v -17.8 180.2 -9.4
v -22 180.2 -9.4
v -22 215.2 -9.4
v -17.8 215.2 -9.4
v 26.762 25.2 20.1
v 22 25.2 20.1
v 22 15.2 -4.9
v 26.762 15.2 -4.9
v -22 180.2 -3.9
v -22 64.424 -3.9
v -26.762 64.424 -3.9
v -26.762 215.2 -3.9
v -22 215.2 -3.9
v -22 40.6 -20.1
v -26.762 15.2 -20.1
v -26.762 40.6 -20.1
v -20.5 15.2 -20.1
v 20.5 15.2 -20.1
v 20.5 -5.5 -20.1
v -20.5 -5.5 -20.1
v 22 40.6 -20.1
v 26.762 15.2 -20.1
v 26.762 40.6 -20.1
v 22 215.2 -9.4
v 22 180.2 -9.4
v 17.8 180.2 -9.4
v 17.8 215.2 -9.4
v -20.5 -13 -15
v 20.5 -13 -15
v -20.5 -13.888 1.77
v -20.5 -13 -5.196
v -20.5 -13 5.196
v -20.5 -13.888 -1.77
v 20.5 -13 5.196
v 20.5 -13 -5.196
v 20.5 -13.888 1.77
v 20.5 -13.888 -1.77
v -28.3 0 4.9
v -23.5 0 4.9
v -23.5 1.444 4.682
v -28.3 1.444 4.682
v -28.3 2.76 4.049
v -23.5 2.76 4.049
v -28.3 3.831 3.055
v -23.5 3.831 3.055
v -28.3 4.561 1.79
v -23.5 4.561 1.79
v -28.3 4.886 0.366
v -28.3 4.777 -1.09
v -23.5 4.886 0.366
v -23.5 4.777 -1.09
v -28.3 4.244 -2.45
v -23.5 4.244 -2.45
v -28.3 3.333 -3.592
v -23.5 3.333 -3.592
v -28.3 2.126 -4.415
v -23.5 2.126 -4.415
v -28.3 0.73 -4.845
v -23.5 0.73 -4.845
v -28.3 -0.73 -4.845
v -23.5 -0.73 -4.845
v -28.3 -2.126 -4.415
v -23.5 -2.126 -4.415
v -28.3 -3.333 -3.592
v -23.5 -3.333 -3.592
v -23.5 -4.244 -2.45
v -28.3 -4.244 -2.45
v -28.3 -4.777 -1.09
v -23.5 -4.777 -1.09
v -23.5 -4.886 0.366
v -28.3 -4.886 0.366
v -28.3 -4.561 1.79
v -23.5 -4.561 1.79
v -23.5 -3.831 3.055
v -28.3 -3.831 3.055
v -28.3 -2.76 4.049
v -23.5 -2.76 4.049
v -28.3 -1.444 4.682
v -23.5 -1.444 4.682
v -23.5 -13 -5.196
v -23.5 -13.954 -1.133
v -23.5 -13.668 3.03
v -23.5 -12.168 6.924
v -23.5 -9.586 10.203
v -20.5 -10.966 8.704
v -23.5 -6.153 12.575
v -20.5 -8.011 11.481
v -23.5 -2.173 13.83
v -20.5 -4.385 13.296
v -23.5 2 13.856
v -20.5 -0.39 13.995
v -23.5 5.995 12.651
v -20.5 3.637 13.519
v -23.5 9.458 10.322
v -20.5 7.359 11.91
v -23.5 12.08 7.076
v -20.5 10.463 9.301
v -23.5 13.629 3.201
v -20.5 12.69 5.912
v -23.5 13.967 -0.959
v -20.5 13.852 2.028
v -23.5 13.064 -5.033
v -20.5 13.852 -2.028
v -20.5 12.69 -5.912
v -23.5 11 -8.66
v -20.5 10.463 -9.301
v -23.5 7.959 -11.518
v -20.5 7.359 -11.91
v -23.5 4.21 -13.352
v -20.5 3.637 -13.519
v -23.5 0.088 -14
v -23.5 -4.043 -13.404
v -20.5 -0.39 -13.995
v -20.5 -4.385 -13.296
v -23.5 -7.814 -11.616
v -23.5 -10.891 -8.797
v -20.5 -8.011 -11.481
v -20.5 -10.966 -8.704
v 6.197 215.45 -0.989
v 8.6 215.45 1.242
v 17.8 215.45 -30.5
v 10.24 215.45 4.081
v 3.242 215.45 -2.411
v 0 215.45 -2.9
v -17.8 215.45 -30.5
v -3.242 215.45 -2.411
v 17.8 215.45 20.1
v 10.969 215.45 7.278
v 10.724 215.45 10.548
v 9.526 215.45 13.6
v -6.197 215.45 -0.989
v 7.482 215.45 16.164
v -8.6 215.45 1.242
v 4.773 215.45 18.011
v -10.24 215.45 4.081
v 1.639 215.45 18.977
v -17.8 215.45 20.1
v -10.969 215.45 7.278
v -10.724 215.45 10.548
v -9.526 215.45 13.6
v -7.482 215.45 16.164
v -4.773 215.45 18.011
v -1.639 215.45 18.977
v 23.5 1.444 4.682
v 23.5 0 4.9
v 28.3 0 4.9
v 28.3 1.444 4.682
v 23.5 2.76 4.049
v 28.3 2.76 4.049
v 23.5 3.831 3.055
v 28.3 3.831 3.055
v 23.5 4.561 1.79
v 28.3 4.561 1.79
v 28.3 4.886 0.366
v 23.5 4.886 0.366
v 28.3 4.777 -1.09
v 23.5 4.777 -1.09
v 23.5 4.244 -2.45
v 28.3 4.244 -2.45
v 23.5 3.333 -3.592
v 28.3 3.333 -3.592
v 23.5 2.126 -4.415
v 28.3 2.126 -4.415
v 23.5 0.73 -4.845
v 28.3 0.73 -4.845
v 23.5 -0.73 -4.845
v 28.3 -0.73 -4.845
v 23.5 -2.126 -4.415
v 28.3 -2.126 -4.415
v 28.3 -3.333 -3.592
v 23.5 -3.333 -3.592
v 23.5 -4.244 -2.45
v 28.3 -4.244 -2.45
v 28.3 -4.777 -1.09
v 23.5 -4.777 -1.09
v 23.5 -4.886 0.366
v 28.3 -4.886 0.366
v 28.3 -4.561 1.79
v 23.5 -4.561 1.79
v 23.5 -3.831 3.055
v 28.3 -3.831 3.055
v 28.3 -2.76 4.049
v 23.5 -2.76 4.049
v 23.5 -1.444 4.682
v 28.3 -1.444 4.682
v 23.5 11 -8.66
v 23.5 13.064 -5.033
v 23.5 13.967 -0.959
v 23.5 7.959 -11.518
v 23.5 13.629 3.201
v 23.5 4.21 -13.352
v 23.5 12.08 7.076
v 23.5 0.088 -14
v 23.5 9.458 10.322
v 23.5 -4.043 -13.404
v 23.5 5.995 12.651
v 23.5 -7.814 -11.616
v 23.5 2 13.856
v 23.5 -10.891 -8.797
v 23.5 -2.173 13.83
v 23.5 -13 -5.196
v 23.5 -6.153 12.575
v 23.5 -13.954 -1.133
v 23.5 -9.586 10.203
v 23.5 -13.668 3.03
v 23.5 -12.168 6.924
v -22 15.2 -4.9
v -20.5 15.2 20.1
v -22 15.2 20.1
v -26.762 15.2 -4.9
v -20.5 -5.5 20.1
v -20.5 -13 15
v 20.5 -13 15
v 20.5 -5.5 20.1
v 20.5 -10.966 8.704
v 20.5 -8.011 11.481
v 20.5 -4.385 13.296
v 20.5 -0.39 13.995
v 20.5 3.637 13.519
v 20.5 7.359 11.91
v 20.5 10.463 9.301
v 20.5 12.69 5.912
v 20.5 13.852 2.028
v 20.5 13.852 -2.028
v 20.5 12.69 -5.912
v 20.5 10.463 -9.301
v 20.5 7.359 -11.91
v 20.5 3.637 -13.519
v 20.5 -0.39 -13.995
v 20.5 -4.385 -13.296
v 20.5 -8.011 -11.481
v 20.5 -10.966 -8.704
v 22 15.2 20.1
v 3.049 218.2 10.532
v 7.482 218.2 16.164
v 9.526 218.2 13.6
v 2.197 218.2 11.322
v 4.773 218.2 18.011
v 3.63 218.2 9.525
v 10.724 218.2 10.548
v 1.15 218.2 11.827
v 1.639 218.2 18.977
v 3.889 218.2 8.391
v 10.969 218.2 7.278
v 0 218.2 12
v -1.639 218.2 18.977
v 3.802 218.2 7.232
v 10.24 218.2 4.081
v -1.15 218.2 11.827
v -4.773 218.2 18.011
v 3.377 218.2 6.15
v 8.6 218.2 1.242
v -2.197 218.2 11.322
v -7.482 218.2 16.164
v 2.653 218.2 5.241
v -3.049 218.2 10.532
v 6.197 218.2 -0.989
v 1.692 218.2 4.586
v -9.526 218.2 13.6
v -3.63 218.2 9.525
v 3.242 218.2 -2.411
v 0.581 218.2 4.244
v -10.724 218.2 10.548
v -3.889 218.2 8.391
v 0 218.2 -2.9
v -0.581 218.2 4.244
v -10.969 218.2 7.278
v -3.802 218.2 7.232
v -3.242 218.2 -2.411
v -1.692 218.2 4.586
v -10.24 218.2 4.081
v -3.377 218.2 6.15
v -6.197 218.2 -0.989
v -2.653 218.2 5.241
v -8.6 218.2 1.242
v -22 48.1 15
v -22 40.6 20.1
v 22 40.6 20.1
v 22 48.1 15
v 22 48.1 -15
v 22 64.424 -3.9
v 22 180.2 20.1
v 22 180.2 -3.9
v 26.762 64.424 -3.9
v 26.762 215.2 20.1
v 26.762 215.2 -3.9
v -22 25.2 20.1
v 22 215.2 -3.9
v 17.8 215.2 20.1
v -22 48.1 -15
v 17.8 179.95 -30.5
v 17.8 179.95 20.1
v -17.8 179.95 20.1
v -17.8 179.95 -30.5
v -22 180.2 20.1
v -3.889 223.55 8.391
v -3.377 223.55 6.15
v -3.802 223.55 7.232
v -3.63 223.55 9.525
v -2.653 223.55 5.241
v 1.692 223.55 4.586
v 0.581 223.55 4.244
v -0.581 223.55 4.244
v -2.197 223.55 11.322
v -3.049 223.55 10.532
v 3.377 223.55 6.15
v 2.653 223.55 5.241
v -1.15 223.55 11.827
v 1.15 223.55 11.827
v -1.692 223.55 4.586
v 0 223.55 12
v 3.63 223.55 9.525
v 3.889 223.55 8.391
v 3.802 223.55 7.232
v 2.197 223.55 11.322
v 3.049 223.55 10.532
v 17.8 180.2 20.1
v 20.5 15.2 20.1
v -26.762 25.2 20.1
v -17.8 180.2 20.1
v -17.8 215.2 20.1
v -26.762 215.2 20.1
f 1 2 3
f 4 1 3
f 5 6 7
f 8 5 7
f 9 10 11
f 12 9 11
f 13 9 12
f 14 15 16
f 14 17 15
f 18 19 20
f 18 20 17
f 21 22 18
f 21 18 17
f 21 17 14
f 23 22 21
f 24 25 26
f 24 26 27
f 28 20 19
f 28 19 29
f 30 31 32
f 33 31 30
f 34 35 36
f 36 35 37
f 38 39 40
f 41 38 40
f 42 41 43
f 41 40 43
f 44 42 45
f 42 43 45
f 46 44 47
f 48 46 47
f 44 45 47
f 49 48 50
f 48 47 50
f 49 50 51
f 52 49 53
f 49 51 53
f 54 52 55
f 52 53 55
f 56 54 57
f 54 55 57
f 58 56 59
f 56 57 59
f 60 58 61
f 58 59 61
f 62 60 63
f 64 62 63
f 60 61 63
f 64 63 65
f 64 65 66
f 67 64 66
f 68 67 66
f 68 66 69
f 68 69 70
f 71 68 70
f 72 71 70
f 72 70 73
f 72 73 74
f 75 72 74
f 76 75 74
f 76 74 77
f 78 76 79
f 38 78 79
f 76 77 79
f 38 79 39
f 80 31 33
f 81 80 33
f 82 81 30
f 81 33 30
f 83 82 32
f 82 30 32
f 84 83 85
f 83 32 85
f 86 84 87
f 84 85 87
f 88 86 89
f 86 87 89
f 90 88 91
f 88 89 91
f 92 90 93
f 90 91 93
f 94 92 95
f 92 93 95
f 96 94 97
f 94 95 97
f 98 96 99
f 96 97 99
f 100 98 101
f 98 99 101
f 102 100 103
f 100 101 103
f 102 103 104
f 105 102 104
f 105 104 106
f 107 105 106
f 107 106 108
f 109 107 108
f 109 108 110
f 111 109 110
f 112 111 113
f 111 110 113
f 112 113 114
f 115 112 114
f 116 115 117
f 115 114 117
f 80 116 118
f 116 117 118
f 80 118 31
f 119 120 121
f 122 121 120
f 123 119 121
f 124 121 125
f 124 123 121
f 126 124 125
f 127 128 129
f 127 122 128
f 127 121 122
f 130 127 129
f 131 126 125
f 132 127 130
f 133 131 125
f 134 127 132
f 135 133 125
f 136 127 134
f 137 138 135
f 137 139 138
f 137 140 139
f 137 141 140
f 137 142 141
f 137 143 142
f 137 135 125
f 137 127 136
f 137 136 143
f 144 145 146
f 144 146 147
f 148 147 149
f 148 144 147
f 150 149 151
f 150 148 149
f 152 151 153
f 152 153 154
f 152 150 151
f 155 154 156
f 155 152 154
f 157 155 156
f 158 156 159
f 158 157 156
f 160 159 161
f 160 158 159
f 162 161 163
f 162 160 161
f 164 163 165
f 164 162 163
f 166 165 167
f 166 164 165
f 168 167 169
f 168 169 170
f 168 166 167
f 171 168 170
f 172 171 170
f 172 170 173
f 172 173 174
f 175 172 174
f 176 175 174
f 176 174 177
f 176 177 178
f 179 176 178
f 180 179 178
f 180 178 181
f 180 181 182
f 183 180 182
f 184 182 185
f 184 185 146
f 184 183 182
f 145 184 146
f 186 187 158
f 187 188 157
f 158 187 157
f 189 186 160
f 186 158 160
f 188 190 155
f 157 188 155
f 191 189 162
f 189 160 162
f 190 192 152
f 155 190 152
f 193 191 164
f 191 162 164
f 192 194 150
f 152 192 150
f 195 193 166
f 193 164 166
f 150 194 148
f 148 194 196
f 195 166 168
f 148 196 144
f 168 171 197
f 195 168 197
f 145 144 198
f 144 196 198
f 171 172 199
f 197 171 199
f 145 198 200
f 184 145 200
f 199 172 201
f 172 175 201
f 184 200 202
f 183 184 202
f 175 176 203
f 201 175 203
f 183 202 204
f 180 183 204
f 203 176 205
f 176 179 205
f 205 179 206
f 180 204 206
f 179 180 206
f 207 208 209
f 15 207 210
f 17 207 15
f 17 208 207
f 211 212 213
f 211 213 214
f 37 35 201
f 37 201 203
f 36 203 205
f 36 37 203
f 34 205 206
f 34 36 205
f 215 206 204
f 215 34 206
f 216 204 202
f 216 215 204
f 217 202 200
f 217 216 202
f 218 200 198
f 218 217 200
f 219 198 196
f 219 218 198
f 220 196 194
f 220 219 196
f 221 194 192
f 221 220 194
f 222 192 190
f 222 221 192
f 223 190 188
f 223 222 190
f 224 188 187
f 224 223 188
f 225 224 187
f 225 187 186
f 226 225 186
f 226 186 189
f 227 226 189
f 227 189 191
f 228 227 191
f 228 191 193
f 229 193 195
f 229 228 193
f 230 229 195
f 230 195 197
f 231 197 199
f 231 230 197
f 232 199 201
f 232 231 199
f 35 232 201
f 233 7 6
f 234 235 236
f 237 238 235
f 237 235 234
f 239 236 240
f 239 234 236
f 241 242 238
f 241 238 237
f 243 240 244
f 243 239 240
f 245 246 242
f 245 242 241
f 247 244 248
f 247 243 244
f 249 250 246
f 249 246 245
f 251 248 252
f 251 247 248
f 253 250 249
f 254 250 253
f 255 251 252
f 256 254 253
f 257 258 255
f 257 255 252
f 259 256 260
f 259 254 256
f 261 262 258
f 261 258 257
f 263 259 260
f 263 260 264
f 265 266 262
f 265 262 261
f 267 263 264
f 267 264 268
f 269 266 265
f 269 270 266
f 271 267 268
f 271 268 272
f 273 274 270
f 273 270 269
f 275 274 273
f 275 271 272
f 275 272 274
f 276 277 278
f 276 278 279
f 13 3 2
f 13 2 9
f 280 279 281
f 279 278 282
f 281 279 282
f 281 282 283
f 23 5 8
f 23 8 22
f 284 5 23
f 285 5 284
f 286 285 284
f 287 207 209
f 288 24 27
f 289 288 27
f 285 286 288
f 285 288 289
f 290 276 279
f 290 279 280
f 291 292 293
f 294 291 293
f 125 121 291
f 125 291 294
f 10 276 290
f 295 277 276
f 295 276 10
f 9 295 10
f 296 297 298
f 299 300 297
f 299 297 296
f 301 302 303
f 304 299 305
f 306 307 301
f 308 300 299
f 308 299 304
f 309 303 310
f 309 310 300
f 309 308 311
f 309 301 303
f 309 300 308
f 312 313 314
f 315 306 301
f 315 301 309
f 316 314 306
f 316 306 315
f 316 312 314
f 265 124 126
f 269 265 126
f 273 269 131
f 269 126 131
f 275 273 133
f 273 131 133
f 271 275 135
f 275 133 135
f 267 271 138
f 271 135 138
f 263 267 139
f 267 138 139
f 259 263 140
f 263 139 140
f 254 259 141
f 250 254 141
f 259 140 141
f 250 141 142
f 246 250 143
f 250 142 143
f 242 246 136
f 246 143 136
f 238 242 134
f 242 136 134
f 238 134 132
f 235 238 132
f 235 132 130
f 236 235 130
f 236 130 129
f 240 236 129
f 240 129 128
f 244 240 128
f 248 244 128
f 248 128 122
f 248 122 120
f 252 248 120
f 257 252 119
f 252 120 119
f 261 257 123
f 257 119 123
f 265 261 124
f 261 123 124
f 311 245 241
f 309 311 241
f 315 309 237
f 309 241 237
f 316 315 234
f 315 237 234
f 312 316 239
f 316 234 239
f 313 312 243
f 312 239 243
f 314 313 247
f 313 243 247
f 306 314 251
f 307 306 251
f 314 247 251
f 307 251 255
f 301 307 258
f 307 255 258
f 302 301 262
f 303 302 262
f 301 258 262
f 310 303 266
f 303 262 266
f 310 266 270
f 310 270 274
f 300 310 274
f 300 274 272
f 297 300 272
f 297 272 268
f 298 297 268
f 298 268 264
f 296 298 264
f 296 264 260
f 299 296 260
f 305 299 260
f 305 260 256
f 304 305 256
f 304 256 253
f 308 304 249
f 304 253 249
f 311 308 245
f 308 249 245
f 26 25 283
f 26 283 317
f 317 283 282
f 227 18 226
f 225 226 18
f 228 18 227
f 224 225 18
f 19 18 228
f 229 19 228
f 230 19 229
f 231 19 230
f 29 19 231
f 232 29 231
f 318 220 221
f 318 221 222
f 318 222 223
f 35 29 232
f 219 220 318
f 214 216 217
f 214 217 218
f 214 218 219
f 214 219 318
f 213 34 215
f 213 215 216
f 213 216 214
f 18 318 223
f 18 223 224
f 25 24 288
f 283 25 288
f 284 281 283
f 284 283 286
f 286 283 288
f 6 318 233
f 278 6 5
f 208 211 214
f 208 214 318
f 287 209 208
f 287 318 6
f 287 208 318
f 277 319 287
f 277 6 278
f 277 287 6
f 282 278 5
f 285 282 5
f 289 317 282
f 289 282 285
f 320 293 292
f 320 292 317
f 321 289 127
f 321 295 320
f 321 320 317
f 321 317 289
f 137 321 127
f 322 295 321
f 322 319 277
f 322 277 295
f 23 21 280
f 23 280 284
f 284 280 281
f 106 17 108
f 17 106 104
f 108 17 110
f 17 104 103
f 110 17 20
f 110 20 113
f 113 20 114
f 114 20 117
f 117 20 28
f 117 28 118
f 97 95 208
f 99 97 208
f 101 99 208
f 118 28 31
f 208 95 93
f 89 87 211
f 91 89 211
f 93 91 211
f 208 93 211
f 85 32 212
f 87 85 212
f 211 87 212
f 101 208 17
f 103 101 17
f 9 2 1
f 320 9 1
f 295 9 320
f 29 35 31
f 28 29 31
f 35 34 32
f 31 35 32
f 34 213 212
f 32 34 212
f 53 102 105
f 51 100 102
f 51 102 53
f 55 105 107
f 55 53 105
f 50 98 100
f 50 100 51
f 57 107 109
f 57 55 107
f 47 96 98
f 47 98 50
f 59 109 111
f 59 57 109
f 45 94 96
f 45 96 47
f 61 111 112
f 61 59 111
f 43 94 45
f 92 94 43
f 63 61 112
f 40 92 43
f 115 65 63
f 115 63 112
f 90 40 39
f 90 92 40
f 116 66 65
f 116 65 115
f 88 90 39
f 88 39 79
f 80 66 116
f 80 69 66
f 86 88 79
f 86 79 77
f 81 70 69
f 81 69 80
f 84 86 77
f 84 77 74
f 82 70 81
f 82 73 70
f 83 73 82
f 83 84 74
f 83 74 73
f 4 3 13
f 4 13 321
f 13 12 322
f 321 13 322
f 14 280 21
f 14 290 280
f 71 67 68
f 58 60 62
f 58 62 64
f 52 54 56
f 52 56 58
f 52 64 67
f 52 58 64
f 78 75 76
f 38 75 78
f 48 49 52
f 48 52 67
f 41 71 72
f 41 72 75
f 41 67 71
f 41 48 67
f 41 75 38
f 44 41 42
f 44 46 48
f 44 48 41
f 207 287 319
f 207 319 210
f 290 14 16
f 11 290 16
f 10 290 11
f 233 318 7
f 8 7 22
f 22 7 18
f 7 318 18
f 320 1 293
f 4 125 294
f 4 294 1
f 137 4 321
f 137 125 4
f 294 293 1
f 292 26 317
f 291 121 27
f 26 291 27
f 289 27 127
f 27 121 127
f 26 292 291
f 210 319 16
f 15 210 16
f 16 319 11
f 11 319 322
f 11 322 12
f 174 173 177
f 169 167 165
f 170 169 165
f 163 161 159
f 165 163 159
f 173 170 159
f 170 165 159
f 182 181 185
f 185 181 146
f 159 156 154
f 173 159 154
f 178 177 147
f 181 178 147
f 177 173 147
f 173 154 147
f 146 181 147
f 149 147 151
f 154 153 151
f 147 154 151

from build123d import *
from OCP.BRepFilletAPI import BRepFilletAPI_MakeChamfer

# Parameters (mm, degrees)
SKETCH1_W           = 41
SKETCH1_H           = 40.2
BOSS_EXTRUDE1_DEPTH = 61.1
SKETCH2_R           = 14
BOSS_EXTRUDE2_DEPTH = 3
SKETCH3_R           = 4.9
BOSS_EXTRUDE3_DEPTH = 4.8
CHAMFER1_SIZE       = 7.5
CHAMFER1_SIZE2      = 5.1
MIRROR5_START       = -20.5
MIRROR5_DEPTH       = 41
BOSS_EXTRUDE4_DEPTH = 1.5
BOSS_EXTRUDE5_DEPTH = 4.7625
SKETCH7_W           = 35.6
SKETCH7_H           = 50.6
BOSS_EXTRUDE6_DEPTH = 35.5
SKETCH9_W           = 29.5
SKETCH9_H           = 35
BOSS_EXTRUDE7_DEPTH = 39.8
SKETCH10_R          = 11
BOSS_EXTRUDE8_DEPTH = 2.75
SKETCH11_R          = 3.9
BOSS_EXTRUDE9_DEPTH = 5.35


# Read off the part's stored shape, not the designer's step: Mirror5
with BuildPart() as part:
    # Sketch1 → Boss-Extrude1 (new body)
    with BuildSketch(Plane(origin=(0, -13, 0), x_dir=(-1, 0, 0), z_dir=(0, 1, 0))):
        Rectangle(SKETCH1_W, SKETCH1_H)
    extrude(amount=BOSS_EXTRUDE1_DEPTH)

    # Sketch2 → Boss-Extrude2 (add)
    with BuildSketch(Plane.ZY.offset(20.5)):
        with Locations(Location((0, 0, 0), (0, 0, 248.213210702))):
            Circle(SKETCH2_R)
    boss_extrude2 = extrude(amount=BOSS_EXTRUDE2_DEPTH)

    # Sketch3 → Boss-Extrude3 (add)
    with BuildSketch(Plane.ZY.offset(23.5)):
        Circle(SKETCH3_R)
    boss_extrude3 = extrude(amount=BOSS_EXTRUDE3_DEPTH)

    # Chamfer1: one chamfer whose edges measure the first distance from different faces: ONE call of the kernel's chamfer builder (chamfer() names one face for all edges)
    chamfer1_edges_1 = [part.edges().sort_by_distance(p)[0] for p in [
        (0, 48.1, -20.1),
    ]]
    chamfer1_side_1 = [part.faces().sort_by_distance(p)[0] for p in [
        (0, 17.55, -20.1),
    ]]
    chamfer1_edges_2 = [part.edges().sort_by_distance(p)[0] for p in [
        (0, 48.1, 20.1),
    ]]
    chamfer1_side_2 = [part.faces().sort_by_distance(p)[0] for p in [
        (0, 17.55, 20.1),
    ]]
    chamfer1 = BRepFilletAPI_MakeChamfer(part.part.solid().wrapped)
    for e in chamfer1_edges_1:
        chamfer1.Add(CHAMFER1_SIZE, CHAMFER1_SIZE2, e.wrapped, chamfer1_side_1[0].wrapped)  # the first distance lies on this face
    for e in chamfer1_edges_2:
        chamfer1.Add(CHAMFER1_SIZE, CHAMFER1_SIZE2, e.wrapped, chamfer1_side_2[0].wrapped)  # the first distance lies on this face
    add(Compound.cast(chamfer1.Shape()), mode=Mode.REPLACE)

    # Mirror5 outline → Mirror5 (cut)
    with BuildSketch(Plane.YZ.offset(MIRROR5_START)):
        Polygon((-13, 20.1), (-13, 15), (-5.5, 20.1), align=None)
        Polygon((-5.5, -20.1), (-13, -15), (-13, -20.1), align=None)
    extrude(amount=MIRROR5_DEPTH, mode=Mode.SUBTRACT)

    # Sketch4 → Boss-Extrude4 (add)
    with BuildSketch(Plane.ZY.offset(20.5)):
        Polygon((-20.1, 15.2), (20.1, 15.2), (20.1, 40.6), (15, 48.1), (-15, 48.1), (-20.1, 40.6), align=None)
    boss_extrude4 = extrude(amount=BOSS_EXTRUDE4_DEPTH)

    # Mirror1: Boss-Extrude2, Boss-Extrude3, Boss-Extrude4 across plane
    add(boss_extrude2.mirror(Plane(origin=(0, 0, 0), x_dir=(0, 0, 1), z_dir=(1, 0, 0))))
    add(boss_extrude3.mirror(Plane(origin=(0, 0, 0), x_dir=(0, 0, 1), z_dir=(1, 0, 0))))
    add(boss_extrude4.mirror(Plane(origin=(0, 0, 0), x_dir=(0, 0, 1), z_dir=(1, 0, 0))))

    # Sketch6 → Boss-Extrude5 (add)
    with BuildSketch(Plane(origin=(22, 0, 0), x_dir=(0, 0, -1), z_dir=(1, 0, 0))):
        Polygon((20.1, 15.2), (20.1, 40.6), (3.9, 64.423529412), (3.9, 215.2), (-20.1, 215.2), (-20.1, 25.2), (4.9, 15.2), align=None)
    boss_extrude5 = extrude(amount=BOSS_EXTRUDE5_DEPTH)

    # Mirror2: Boss-Extrude5 across plane
    add(boss_extrude5.mirror(Plane(origin=(0, 0, 0), x_dir=(0, 0, 1), z_dir=(1, 0, 0))))



with BuildPart() as body_2:
    # Sketch7 → Boss-Extrude6 (new body)
    with BuildSketch(Plane(origin=(0, 215.45, 0), x_dir=(-1, 0, 0), z_dir=(0, 1, 0))):
        with Locations((0, -5.2)):
            Rectangle(SKETCH7_W, SKETCH7_H)
    extrude(amount=-BOSS_EXTRUDE6_DEPTH)


with BuildPart() as part_1:
    add(part.part)

    add(body_2.part)  # Boss-Extrude7 merges body 2
    # Sketch9 → Boss-Extrude7 (add)
    with BuildSketch(Plane.ZY.offset(-22)):
        with Locations((5.35, 197.7)):
            Rectangle(SKETCH9_W, SKETCH9_H)
    boss_extrude7 = extrude(amount=BOSS_EXTRUDE7_DEPTH)

    # Mirror3: Boss-Extrude7 across plane
    add(boss_extrude7.mirror(Plane(origin=(0, 0, 0), x_dir=(0, 0, 1), z_dir=(1, 0, 0))))

    # Sketch10 → Boss-Extrude8 (add)
    with BuildSketch(Plane(origin=(0, 215.45, 0), x_dir=(-1, 0, 0), z_dir=(0, 1, 0))):
        with Locations(Location((0, 8.1, 0), (0, 0, 270))):
            Circle(SKETCH10_R)
    extrude(amount=BOSS_EXTRUDE8_DEPTH)

    # Sketch11 → Boss-Extrude9 (add)
    with BuildSketch(Plane(origin=(0, 218.2, 0), x_dir=(-1, 0, 0), z_dir=(0, 1, 0))):
        with Locations(Location((0, 8.1, 0), (0, 0, 90))):
            Circle(SKETCH11_R)
    extrude(amount=BOSS_EXTRUDE9_DEPTH)


solid = part_1.part
